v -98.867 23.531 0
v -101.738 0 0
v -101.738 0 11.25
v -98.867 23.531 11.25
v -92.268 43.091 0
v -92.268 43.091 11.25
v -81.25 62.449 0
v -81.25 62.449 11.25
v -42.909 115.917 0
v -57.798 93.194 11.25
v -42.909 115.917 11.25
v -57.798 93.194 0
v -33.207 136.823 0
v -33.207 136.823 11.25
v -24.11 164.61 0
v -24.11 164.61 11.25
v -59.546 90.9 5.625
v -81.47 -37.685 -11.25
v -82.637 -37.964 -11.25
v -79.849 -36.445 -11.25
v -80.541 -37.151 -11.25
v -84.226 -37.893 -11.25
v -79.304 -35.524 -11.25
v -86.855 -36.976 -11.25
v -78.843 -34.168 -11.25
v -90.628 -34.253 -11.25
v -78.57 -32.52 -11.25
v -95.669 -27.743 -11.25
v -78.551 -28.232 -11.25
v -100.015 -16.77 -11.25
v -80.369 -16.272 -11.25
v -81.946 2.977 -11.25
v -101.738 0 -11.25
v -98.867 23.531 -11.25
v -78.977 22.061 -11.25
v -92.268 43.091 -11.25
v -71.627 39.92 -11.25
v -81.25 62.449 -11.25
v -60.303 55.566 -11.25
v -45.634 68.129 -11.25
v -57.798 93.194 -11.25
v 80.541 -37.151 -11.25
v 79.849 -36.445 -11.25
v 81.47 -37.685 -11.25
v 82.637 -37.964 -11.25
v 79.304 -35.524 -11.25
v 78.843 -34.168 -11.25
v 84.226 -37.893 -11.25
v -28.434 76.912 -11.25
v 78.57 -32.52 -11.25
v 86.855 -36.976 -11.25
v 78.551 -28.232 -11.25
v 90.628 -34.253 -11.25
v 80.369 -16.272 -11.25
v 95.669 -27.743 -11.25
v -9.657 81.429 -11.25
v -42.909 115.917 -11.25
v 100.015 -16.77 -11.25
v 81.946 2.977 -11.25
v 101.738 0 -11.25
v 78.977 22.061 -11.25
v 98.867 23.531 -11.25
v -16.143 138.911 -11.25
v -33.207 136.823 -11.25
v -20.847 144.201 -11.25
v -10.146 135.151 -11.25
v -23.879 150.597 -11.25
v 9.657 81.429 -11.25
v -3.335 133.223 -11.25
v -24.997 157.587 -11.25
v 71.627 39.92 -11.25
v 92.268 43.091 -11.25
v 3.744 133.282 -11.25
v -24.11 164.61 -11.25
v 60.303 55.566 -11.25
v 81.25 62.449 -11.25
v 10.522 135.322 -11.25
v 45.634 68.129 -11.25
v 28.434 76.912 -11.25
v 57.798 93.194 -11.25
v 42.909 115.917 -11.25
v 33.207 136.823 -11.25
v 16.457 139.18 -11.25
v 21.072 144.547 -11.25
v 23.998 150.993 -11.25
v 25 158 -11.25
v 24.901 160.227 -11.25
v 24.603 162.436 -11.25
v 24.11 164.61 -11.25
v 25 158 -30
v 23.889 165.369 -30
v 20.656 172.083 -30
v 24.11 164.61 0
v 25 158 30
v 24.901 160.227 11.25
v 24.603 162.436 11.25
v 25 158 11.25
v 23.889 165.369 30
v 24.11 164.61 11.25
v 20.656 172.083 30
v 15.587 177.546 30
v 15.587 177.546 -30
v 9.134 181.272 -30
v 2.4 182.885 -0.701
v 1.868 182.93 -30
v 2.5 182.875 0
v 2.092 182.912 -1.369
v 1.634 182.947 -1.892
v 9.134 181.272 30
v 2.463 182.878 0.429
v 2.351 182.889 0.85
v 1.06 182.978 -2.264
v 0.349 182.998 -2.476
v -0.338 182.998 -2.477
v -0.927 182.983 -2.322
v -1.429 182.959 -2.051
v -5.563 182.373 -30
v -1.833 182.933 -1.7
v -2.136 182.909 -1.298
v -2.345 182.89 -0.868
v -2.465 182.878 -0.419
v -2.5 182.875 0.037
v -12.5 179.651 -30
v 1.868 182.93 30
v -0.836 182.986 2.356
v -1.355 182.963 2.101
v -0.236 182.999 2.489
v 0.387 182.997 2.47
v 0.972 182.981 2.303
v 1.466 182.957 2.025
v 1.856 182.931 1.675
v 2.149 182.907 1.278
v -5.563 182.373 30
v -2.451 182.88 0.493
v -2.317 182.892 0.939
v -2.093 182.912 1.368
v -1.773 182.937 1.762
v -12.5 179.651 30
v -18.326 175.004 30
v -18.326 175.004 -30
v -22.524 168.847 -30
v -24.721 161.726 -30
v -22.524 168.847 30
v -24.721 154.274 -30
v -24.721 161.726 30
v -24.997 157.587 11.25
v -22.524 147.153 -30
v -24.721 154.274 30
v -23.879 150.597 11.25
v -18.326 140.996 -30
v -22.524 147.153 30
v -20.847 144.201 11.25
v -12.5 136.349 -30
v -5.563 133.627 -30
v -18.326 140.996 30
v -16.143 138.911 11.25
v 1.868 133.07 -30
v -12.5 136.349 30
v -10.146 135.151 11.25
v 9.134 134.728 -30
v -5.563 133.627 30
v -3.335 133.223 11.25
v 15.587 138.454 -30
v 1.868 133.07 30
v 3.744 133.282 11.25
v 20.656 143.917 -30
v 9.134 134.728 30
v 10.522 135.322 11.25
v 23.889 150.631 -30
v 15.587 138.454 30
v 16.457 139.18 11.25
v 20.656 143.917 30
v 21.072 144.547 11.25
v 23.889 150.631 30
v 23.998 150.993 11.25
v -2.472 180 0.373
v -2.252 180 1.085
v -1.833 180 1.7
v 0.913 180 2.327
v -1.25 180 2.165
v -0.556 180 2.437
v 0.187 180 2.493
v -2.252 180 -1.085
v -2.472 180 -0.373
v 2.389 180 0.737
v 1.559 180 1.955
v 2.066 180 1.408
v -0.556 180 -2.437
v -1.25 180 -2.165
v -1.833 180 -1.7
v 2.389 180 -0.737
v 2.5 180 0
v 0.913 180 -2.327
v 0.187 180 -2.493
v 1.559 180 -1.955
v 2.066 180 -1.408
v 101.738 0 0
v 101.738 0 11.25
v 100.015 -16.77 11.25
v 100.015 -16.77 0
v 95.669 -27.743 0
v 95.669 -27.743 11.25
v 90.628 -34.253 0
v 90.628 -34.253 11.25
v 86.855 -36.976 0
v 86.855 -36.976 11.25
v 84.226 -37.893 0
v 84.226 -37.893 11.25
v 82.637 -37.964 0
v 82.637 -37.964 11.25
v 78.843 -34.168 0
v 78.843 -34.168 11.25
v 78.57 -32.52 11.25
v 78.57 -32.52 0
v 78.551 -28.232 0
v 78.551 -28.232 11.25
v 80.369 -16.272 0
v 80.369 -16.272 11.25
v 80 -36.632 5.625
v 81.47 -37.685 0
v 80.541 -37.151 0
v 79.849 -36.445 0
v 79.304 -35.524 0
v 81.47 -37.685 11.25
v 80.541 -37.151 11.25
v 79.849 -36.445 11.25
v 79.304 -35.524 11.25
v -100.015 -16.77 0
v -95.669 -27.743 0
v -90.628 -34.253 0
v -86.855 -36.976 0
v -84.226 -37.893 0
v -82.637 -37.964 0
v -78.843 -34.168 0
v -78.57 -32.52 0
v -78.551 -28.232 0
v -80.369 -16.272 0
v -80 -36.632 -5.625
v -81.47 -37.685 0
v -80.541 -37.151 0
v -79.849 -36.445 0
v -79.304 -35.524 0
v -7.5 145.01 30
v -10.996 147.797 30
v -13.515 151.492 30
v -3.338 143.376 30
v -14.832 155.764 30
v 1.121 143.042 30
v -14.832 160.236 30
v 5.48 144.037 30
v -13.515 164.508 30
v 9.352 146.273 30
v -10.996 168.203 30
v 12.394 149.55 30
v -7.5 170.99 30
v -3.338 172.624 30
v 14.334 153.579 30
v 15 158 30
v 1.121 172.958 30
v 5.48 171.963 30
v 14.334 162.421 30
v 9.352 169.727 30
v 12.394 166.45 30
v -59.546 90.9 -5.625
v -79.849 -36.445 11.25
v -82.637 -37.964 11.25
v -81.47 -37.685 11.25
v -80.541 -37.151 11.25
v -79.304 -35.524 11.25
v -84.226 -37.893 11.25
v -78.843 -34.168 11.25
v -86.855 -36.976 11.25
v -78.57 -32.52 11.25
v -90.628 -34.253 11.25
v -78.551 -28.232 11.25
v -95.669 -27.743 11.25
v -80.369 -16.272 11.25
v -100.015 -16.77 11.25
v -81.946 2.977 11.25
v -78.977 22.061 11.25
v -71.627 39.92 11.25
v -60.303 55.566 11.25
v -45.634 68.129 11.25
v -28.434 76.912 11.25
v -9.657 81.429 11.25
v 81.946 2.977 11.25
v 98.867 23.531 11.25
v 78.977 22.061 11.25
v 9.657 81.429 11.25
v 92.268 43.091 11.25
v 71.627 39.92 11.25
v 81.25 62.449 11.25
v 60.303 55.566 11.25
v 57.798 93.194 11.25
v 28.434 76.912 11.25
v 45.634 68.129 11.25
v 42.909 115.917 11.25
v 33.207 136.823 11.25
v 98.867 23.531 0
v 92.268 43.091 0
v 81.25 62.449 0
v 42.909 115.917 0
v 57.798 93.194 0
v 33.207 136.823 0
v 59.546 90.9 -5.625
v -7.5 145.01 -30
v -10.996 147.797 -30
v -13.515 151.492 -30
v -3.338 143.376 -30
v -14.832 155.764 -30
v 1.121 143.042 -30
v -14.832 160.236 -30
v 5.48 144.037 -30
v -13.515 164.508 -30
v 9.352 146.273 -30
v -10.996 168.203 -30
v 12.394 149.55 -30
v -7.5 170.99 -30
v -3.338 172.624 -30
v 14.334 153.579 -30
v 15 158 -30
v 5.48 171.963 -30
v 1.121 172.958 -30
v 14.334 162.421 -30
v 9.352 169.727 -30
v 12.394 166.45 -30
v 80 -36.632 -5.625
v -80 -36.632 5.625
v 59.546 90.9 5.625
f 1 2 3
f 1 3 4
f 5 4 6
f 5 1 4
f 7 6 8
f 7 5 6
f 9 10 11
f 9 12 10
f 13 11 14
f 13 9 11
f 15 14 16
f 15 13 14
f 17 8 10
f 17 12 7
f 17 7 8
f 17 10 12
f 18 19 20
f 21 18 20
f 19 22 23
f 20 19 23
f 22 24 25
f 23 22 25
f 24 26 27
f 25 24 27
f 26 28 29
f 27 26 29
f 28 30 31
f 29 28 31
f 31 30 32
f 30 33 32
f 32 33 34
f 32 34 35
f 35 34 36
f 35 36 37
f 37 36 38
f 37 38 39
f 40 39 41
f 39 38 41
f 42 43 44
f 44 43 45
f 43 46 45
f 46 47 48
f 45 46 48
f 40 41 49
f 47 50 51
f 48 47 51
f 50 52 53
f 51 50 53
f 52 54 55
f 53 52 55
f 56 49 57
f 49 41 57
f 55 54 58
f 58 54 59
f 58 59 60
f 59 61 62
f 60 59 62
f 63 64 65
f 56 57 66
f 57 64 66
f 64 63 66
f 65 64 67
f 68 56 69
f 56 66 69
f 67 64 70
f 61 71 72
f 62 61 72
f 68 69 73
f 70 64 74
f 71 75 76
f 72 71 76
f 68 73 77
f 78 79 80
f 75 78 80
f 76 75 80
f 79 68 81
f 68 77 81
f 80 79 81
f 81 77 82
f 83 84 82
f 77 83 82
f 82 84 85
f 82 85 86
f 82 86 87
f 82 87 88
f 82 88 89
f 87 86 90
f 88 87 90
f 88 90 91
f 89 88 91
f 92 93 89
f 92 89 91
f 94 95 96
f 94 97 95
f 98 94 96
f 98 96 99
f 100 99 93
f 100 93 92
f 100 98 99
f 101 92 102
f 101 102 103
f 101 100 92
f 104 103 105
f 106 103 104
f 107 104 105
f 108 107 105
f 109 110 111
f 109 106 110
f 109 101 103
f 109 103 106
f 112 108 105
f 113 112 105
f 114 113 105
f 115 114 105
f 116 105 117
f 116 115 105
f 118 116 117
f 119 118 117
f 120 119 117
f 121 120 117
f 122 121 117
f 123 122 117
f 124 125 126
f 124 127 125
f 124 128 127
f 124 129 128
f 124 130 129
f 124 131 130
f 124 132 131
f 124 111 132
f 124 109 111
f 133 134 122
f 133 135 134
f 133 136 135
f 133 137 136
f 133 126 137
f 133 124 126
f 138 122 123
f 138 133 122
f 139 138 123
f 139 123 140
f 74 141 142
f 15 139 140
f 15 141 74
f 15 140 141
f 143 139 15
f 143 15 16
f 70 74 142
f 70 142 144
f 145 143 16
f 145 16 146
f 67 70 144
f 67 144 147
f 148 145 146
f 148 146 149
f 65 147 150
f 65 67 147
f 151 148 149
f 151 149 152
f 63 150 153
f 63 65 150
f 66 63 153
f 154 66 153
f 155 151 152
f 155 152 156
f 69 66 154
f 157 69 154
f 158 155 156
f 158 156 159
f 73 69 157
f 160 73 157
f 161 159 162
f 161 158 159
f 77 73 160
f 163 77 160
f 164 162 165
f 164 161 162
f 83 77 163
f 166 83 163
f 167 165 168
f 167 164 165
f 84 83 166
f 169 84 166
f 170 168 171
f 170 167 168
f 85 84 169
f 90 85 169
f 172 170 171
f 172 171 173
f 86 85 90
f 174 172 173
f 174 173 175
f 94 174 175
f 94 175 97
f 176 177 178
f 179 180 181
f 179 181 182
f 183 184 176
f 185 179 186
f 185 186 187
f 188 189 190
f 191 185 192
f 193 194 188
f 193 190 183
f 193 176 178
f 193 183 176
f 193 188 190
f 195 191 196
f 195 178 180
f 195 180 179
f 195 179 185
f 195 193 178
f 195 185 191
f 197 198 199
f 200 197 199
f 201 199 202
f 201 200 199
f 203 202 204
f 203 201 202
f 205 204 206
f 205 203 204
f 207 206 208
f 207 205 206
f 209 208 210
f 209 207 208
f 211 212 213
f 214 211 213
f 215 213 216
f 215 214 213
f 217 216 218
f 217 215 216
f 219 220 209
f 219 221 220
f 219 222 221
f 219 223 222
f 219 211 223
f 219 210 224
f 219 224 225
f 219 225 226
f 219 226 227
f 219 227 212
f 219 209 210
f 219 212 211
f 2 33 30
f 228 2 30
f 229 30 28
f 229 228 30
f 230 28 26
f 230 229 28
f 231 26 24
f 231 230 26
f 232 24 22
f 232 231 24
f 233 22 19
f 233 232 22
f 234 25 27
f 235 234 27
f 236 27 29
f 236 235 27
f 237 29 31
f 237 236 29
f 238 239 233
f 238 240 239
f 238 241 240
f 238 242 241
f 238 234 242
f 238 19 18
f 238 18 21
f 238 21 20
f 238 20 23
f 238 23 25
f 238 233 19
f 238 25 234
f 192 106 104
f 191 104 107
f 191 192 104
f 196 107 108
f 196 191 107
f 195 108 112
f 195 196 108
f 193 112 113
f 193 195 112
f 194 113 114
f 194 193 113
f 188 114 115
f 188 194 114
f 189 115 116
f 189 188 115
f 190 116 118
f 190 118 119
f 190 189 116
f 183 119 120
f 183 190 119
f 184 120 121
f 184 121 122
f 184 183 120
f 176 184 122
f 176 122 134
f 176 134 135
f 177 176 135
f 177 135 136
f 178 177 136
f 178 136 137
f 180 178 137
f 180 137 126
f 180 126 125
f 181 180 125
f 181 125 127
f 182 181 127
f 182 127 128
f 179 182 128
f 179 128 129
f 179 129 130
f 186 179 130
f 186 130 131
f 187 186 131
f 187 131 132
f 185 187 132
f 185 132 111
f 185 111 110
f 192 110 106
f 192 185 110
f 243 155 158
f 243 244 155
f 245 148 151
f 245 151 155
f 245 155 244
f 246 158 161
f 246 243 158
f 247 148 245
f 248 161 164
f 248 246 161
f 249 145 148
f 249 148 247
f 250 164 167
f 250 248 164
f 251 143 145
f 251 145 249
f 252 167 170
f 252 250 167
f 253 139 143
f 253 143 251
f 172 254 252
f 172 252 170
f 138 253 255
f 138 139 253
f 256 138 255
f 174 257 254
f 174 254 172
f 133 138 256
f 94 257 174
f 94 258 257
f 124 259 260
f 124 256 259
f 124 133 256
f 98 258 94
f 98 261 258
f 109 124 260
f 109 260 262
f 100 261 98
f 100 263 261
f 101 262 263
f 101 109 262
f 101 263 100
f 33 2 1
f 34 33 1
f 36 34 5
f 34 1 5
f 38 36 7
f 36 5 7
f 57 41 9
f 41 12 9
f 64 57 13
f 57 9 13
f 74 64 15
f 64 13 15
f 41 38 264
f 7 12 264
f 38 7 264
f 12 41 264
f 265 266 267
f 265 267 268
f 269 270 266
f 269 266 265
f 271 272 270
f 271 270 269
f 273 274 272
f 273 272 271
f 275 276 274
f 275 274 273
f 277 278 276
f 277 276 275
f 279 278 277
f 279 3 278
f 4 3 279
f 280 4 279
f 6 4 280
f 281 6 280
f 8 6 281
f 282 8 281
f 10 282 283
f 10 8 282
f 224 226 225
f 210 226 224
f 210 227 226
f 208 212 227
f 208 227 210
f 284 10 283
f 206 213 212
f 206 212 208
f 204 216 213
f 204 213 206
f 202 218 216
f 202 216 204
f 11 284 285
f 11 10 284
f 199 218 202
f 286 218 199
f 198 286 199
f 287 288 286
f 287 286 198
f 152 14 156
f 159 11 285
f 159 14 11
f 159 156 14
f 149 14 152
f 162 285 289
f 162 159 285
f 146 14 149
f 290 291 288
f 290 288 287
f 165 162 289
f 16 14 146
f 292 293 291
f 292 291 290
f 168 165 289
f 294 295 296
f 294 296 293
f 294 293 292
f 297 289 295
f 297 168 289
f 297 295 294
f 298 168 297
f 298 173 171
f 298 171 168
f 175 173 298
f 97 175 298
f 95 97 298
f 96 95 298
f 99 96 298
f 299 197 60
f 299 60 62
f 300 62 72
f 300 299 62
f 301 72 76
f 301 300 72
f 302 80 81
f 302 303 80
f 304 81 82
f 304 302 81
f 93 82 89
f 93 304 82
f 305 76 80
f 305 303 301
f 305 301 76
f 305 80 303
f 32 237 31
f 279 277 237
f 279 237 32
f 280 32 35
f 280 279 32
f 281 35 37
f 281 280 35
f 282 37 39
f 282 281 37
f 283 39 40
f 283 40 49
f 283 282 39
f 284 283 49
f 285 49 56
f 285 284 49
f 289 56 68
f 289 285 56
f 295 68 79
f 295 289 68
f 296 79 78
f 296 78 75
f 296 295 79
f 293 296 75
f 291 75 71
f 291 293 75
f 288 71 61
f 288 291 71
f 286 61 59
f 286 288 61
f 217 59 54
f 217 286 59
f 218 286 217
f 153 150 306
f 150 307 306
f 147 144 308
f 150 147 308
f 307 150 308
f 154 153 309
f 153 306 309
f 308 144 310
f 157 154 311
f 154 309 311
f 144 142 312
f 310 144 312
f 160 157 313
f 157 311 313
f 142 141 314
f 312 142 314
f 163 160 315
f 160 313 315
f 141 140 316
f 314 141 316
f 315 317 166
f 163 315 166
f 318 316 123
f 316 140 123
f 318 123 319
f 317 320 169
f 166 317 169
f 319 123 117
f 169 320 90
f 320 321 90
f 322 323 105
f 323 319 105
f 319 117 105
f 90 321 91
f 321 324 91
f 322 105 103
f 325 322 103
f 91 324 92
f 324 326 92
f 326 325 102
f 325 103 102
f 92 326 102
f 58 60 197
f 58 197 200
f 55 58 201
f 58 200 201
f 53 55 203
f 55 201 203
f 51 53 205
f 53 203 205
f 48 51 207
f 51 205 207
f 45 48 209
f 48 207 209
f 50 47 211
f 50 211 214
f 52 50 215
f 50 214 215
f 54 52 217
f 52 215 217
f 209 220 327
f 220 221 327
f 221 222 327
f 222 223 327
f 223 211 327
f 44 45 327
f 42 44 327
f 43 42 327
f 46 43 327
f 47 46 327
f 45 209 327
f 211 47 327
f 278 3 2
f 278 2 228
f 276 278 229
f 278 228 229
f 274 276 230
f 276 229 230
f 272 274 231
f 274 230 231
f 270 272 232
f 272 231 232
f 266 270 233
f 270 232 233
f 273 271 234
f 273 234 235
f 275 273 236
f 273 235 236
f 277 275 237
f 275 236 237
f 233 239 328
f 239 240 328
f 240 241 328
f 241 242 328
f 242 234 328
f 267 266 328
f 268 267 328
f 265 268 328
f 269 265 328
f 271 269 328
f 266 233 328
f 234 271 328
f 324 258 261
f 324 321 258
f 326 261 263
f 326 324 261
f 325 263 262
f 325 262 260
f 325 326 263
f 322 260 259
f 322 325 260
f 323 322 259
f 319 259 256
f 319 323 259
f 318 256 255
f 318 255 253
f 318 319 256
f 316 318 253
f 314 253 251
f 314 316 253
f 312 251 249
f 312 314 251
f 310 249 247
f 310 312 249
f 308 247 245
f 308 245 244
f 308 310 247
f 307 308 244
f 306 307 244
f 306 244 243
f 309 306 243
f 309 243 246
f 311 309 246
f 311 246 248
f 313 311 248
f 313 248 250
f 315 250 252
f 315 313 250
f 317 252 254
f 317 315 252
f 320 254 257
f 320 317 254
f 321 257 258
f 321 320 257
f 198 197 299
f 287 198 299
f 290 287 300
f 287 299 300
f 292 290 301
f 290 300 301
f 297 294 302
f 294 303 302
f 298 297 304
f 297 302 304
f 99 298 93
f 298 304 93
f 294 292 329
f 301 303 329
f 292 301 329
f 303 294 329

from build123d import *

# Parameters (mm, degrees)
BOSS_EXTRUDE1_DEPTH = 11.25
SKETCH1_3_R         = 25
SKETCH1_3_R_2       = 15
BOSS_EXTRUDE2_DEPTH = 30
SKETCH3_R           = 2.5
CUT_EXTRUDE1_DEPTH  = 4


with BuildPart() as part:
    # Sketch1 → Boss-Extrude1 (new body, symmetric)
    with BuildSketch(Plane.XY):
        with BuildLine():
            ThreePointArc((-80.369346148, -16.271699348), (0, 82), (80.369346148, -16.271699348))
            add(Edge.make_bspline(
                [(101.737711244, 0), (102.498129601, -29.89988011), (76.506237686, -48.322432058), (78.198626966, -26.993338043), (80.369346148, -16.271699348)],
                knots=[0, 0, 0, 0, 0.676560131, 1, 1, 1, 1], degree=3))
            add(Edge.make_bspline(
                [(101.737711244, 0), (100.620263928, 43.938366918), (64.346417004, 80.312533322), (34.633446861, 126.224897928), (24.110391918, 164.609765621)],
                knots=[0, 0, 0, 0, 0.598565743, 1, 1, 1, 1], degree=3))
            ThreePointArc((24.110391918, 164.609765621), (24.776599827, 161.334681548), (25, 158))
            ThreePointArc((25, 158), (-3.334681548, 133.223400173), (-24.110391918, 164.609765621))
            add(Edge.make_bspline(
                [(-101.737711244, 0), (-100.620263928, 43.938366918), (-64.346417004, 80.312533322), (-34.633446861, 126.224897928), (-24.110391918, 164.609765621)],
                knots=[0, 0, 0, 0, 0.598565743, 1, 1, 1, 1], degree=3))
            add(Edge.make_bspline(
                [(-101.737711244, 0), (-102.498129601, -29.89988011), (-76.506237686, -48.322432058), (-78.198626966, -26.993338043), (-80.369346148, -16.271699348)],
                knots=[0, 0, 0, 0, 0.676560131, 1, 1, 1, 1], degree=3))
        make_face()
    extrude(amount=BOSS_EXTRUDE1_DEPTH, both=True)

    # Sketch1<3> → Boss-Extrude2 (add, symmetric)
    with BuildSketch(Plane.XY):
        with Locations((0, 158)):
            Circle(SKETCH1_3_R)
        with Locations((0, 158)):
            Circle(SKETCH1_3_R_2, mode=Mode.SUBTRACT)
    extrude(amount=BOSS_EXTRUDE2_DEPTH, both=True)

    # Sketch3 → Cut-Extrude1 (cut, through all)
    with BuildSketch(Plane(origin=(0, 180, 0), x_dir=(1, 0, 0), z_dir=(0, 1, 0))):
        Circle(SKETCH3_R)
    extrude(amount=CUT_EXTRUDE1_DEPTH, mode=Mode.SUBTRACT)


solid = part.part
